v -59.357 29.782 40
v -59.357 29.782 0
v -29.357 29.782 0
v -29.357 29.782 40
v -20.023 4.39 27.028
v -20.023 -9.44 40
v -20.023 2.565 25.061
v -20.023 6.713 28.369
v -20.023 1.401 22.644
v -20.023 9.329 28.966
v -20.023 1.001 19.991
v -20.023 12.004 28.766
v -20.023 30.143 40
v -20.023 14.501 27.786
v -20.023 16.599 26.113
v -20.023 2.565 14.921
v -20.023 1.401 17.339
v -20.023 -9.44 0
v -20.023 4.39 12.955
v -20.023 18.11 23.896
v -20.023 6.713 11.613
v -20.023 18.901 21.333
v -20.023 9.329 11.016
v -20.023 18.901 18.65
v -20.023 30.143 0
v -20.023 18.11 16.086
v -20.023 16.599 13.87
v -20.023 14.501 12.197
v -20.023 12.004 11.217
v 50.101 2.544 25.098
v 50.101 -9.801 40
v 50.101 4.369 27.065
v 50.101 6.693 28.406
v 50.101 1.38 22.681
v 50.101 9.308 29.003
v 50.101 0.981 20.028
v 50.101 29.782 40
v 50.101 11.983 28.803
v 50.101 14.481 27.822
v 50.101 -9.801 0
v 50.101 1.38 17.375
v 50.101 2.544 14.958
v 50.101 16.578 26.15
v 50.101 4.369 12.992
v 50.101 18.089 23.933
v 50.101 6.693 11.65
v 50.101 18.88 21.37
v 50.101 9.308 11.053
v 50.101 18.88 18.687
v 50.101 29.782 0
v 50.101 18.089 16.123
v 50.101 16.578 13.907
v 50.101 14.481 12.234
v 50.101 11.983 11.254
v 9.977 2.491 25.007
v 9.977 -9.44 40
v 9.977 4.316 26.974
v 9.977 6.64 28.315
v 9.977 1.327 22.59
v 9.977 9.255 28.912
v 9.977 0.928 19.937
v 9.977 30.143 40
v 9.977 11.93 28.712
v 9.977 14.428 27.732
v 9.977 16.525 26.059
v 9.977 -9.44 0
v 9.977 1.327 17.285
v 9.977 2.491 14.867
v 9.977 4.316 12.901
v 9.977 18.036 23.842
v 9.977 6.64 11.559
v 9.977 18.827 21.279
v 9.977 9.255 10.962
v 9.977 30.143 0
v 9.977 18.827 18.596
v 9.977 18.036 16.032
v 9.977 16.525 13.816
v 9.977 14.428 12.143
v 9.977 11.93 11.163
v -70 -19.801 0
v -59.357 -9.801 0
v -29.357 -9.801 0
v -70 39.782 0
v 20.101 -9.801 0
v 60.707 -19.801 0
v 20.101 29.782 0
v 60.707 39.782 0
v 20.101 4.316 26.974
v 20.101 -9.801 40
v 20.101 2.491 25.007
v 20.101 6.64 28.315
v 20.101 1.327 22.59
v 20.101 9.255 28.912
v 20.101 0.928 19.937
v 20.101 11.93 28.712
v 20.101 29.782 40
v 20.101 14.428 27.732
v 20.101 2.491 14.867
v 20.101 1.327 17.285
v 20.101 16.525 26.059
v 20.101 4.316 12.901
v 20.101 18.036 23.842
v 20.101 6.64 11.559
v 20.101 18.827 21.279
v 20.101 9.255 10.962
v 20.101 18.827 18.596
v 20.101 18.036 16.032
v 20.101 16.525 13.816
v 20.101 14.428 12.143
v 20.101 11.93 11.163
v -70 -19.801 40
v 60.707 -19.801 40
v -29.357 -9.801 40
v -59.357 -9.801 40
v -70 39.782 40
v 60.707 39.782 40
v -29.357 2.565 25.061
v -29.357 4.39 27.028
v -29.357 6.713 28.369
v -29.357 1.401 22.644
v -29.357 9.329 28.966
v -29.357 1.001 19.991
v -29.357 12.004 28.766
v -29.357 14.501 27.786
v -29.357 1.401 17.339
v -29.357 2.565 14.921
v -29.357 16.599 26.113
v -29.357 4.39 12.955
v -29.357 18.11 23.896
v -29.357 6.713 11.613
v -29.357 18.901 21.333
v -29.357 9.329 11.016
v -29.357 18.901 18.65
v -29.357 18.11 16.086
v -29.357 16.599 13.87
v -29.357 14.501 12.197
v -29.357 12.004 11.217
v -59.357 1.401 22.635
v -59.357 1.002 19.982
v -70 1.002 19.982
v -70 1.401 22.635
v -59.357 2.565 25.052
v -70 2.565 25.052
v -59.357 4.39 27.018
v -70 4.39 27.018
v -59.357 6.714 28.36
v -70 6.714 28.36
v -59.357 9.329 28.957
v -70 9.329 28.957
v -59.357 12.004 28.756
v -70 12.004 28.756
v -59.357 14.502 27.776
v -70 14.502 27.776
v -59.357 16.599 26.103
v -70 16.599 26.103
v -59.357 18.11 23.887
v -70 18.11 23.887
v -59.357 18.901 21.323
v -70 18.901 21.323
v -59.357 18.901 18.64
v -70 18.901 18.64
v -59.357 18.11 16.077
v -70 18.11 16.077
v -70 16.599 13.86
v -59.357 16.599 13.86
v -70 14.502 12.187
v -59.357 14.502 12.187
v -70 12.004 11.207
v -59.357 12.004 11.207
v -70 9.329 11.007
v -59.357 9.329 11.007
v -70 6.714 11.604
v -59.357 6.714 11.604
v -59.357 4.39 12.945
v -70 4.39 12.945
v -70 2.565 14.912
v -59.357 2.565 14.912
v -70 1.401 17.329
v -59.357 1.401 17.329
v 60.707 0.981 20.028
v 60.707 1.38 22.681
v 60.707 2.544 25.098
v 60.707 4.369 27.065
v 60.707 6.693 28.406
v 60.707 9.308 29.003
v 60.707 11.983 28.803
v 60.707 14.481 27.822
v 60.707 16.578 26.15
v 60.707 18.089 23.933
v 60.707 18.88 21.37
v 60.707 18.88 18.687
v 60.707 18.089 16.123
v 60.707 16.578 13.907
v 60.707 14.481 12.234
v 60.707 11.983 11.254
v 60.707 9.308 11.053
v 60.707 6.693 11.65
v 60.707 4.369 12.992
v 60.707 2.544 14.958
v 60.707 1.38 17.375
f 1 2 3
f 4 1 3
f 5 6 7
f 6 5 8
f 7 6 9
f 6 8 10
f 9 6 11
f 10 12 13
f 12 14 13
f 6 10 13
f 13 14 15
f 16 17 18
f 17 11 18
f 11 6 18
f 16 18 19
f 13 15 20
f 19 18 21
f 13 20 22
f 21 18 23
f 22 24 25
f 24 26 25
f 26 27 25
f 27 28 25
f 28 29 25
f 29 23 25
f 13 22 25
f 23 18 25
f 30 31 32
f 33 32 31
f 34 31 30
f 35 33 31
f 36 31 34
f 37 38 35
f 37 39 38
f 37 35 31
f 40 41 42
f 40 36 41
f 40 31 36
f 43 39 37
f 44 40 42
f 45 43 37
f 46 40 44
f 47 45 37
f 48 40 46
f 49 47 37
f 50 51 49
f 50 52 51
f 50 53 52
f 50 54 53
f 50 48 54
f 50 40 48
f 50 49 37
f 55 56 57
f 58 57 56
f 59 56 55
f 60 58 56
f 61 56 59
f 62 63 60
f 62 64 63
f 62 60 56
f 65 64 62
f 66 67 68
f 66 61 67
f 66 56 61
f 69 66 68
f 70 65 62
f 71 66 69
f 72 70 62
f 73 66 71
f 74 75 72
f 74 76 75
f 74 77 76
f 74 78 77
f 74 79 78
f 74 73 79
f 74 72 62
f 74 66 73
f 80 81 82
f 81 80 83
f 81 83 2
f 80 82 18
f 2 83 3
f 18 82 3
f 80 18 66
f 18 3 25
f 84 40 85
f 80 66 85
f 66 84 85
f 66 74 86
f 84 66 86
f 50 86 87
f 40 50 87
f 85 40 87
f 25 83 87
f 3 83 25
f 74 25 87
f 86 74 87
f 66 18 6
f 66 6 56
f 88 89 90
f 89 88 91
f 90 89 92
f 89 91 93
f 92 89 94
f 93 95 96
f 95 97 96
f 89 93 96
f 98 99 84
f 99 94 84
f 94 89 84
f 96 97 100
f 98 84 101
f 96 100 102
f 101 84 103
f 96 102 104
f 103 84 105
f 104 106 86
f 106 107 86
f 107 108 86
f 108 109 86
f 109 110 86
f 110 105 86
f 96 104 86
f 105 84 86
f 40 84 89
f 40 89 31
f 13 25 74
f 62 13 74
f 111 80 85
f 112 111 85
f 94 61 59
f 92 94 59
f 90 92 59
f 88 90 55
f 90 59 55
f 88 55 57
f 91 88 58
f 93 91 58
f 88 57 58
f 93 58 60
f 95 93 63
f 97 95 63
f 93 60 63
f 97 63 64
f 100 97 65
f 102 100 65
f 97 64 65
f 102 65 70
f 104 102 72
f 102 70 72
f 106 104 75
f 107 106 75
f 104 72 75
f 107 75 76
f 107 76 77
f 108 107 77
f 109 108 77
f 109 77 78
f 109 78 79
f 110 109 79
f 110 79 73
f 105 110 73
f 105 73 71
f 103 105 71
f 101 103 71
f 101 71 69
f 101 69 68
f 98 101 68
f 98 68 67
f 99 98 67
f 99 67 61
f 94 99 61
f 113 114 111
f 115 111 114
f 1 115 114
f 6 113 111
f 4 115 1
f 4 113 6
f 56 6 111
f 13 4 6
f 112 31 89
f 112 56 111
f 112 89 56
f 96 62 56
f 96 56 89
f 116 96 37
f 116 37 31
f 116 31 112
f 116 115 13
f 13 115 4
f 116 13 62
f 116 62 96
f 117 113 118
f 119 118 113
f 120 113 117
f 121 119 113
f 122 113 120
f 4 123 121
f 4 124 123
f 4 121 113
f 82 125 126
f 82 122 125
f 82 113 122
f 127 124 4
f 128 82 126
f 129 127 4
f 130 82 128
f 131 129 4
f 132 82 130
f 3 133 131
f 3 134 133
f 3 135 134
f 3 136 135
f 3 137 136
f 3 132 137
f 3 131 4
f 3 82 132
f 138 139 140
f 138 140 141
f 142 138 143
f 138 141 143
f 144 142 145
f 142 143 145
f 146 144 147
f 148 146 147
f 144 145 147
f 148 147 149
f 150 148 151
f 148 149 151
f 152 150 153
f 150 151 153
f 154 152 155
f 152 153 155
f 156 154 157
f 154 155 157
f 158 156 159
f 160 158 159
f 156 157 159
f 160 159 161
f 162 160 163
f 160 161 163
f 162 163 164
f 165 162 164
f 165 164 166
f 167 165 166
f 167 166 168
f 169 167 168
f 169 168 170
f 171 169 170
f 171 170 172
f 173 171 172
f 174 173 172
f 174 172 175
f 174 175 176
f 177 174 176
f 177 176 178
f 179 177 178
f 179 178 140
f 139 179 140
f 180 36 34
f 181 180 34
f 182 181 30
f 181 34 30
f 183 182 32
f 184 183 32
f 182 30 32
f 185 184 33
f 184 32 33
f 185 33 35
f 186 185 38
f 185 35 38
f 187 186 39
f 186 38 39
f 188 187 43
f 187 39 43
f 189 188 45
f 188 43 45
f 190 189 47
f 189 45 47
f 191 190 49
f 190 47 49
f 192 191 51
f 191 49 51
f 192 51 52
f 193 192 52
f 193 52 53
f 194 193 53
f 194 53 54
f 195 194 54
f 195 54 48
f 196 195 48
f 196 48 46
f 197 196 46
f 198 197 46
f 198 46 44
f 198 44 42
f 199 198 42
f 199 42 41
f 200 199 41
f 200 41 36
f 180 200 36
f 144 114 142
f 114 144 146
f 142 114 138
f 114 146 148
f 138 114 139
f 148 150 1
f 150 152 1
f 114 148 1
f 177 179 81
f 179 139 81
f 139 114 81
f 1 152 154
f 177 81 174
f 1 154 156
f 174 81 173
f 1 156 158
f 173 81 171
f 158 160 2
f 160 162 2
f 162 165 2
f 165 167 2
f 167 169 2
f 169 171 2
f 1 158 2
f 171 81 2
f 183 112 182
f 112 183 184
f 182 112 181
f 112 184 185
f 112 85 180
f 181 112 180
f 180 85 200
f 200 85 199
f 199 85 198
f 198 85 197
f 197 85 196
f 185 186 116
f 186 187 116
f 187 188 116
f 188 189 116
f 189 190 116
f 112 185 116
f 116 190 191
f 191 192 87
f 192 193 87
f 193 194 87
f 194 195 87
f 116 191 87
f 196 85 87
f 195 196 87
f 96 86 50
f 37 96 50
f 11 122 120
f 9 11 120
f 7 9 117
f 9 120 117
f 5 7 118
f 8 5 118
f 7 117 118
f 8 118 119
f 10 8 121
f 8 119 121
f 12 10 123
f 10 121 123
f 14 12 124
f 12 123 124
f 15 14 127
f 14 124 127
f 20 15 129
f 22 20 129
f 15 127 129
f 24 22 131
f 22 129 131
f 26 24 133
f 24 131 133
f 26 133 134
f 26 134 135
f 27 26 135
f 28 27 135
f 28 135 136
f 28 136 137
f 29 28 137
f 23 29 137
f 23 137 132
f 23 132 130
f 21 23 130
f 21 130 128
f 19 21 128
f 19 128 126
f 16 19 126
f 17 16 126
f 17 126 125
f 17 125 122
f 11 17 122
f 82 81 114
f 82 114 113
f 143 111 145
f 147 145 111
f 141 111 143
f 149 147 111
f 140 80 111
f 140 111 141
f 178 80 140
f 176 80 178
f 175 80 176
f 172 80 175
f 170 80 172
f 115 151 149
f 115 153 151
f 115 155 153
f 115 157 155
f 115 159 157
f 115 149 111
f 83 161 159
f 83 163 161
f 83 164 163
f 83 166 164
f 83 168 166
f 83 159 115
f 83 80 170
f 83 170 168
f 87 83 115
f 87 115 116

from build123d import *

# Parameters (mm, degrees)
SKETCH_W        = 130.707065
SKETCH_H        = 59.583364
SKETCH_W_2      = 30
SKETCH_H_2      = 39.583364
PAD_DEPTH       = 40
SKETCH001_R     = 9
POCKET_DEPTH    = 32
SKETCH002_R     = 9
POCKET001_DEPTH = 16
SKETCH003_R     = 9
POCKET002_DEPTH = 21
SKETCH004_R     = 9
POCKET003_DEPTH = 23


with BuildPart() as part:
    # Sketch → Pad (new body)
    with BuildSketch(Plane.XY):
        with Locations((-4.646459, 9.990193)):
            Rectangle(SKETCH_W, SKETCH_H)
        with Locations((-44.357391, 9.990193)):
            Rectangle(SKETCH_W_2, SKETCH_H_2, mode=Mode.SUBTRACT)
        with Locations((-5.023146, 10.351241)):
            Rectangle(SKETCH_W_2, SKETCH_H_2, mode=Mode.SUBTRACT)
        with Locations((35.101015, 9.990193)):
            Rectangle(SKETCH_W_2, SKETCH_H_2, mode=Mode.SUBTRACT)
    extrude(amount=PAD_DEPTH)

    # Sketch001 (on Face4 of Pad) → Pocket (cut)
    with BuildSketch(Plane(origin=(-69.999992, 0, 0), x_dir=(0, -1, 0), z_dir=(-1, 0, 0))):
        with Locations((-10.001616, 19.98172)):
            Circle(SKETCH001_R)
    extrude(amount=-POCKET_DEPTH, mode=Mode.SUBTRACT)

    # Sketch002 (on Face17 of Pocket) → Pocket001 (cut)
    with BuildSketch(Plane(origin=(-29.357391, 0, 0), x_dir=(0, -1, 0), z_dir=(-1, 0, 0))):
        with Locations((-10.001346, 19.991329)):
            Circle(SKETCH002_R)
    extrude(amount=-POCKET001_DEPTH, mode=Mode.SUBTRACT)

    # Sketch003 (on Face13 of Pocket001) → Pocket002 (cut)
    with BuildSketch(Plane(origin=(9.976854, 0, 0), x_dir=(0, -1, 0), z_dir=(-1, 0, 0))):
        with Locations((-9.927585, 19.937319)):
            Circle(SKETCH003_R)
    extrude(amount=-POCKET002_DEPTH, mode=Mode.SUBTRACT)

    # Sketch004 (on Face9 of Pocket002) → Pocket003 (cut)
    with BuildSketch(Plane(origin=(50.101015, 0, 0), x_dir=(0, -1, 0), z_dir=(-1, 0, 0))):
        with Locations((-9.980604, 20.028202)):
            Circle(SKETCH004_R)
    extrude(amount=-POCKET003_DEPTH, mode=Mode.SUBTRACT)


solid = part.part
